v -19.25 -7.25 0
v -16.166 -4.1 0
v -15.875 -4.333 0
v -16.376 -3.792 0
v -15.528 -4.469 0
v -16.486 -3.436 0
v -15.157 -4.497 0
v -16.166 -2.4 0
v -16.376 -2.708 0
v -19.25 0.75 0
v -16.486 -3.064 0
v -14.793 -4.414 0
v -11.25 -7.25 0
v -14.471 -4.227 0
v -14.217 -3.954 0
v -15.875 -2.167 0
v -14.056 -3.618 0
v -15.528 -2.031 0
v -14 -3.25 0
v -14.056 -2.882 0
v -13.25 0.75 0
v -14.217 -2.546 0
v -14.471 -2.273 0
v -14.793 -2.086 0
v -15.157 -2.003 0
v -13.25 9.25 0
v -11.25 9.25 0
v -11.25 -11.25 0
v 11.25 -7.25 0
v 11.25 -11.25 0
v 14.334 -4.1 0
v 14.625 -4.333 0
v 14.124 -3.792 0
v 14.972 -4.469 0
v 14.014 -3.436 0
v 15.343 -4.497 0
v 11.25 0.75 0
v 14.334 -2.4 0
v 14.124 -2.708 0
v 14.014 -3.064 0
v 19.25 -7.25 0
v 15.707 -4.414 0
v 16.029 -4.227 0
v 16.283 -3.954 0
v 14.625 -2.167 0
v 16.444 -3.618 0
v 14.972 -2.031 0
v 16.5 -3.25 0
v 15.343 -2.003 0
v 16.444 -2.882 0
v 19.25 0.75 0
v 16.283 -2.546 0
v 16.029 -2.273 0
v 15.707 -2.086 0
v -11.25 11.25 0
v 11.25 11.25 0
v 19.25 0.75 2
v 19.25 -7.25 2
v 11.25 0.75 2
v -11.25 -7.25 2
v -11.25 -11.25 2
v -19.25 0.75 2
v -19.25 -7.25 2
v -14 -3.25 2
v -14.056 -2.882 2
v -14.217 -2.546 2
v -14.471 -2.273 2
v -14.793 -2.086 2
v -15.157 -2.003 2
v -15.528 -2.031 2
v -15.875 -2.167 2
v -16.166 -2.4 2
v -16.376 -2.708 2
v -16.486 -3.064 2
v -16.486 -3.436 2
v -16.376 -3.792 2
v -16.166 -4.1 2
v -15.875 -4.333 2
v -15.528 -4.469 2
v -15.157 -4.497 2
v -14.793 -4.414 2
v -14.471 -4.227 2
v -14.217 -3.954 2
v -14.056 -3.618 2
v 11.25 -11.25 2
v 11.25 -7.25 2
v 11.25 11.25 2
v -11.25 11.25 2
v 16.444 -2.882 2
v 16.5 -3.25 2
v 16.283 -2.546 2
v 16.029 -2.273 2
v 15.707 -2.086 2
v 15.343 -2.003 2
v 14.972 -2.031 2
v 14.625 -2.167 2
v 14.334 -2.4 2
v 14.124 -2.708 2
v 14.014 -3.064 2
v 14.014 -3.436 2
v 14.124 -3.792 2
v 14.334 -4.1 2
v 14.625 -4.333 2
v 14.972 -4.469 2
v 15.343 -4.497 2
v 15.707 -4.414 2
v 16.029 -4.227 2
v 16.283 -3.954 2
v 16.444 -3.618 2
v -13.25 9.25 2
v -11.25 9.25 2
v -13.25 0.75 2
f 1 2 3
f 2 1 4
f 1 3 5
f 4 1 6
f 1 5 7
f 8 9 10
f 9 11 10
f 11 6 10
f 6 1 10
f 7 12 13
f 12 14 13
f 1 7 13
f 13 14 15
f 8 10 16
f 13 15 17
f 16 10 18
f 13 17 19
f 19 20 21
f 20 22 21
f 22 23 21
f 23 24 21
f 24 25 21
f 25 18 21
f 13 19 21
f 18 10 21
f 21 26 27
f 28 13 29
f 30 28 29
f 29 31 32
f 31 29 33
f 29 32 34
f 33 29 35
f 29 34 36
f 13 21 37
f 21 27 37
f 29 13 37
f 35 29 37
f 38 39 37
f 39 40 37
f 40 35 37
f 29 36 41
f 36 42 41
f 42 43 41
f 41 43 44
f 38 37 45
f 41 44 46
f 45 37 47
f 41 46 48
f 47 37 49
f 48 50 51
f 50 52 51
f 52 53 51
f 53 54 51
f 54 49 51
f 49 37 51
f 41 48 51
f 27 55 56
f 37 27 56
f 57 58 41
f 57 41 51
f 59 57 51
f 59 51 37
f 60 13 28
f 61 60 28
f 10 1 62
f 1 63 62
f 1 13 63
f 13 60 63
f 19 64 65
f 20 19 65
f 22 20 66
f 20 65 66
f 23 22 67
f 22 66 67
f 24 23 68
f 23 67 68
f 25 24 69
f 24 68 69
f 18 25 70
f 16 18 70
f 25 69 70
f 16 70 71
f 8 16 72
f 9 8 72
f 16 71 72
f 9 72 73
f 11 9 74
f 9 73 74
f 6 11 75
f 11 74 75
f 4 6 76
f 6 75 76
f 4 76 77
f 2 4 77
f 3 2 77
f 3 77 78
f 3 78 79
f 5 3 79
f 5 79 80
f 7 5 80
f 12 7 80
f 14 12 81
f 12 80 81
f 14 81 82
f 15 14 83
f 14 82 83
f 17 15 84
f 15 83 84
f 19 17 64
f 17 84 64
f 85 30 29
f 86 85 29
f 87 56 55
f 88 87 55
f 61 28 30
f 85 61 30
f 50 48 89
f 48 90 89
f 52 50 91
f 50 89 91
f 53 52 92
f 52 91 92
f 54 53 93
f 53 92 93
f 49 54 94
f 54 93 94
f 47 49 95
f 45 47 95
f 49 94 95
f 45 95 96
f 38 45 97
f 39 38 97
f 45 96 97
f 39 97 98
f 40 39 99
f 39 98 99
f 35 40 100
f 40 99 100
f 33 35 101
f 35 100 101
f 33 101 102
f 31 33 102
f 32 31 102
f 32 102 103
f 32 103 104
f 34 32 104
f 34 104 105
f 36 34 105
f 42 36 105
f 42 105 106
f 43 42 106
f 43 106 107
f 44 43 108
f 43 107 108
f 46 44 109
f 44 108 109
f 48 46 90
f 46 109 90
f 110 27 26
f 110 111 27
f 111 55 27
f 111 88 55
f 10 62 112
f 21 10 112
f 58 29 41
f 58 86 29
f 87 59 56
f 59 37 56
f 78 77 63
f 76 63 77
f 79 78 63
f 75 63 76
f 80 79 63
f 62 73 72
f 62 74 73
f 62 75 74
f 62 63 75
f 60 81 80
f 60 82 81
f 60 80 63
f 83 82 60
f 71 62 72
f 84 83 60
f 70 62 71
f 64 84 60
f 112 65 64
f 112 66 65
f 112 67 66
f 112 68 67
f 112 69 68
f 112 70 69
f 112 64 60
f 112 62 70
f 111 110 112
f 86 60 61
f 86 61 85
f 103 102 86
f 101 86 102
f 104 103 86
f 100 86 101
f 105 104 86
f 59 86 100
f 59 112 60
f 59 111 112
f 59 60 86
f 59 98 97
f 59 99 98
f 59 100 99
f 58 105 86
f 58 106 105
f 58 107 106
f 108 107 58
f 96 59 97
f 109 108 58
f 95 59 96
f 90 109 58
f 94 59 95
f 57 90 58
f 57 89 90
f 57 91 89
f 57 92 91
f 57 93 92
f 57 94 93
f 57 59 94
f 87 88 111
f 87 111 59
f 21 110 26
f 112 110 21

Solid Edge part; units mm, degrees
sketch "Sketch1" plane through (0, 0, 0) normal (0, 0, 1) x (1, 0, 0)
  line L0 (-11.25, -11.25) -> (11.25, -11.25)
  line L1 (11.25, -11.25) -> (11.25, 11.25)
  line L2 (11.25, 11.25) -> (-11.25, 11.25)
  line L3 (-11.25, 11.25) -> (-11.25, -11.25)
  dimension "D1" = 22.5
  dimension "D2" = 22.5
extrude "Protrusion1" add sketch "Sketch1" along normal blind 2
sketch "Sketch2" plane through (0, 0, 2) normal (0, 0, 1) x (1, 0, 0)
  line L0 (11.25, -7.25) -> (19.25, -7.25)
  line L1 (19.25, -7.25) -> (19.25, 0.75)
  line L2 (19.25, 0.75) -> (11.25, 0.75)
  line L3 (11.25, 0.75) -> (11.25, -7.25)
  dimension "D1" = 8
  dimension "D2" = 4
extrude "Protrusion2" add sketch "Sketch2" against normal up to vertex (2 mm away)
sketch "Sketch3" plane through (4, 0, 2) normal (0, 0, 1) x (1, 0, 0)
  line L0 (-15.25, -7.25) -> (-23.25, -7.25)
  line L1 (-23.25, -7.25) -> (-23.25, 0.75)
  line L2 (-23.25, 0.75) -> (-15.25, 0.75)
  line L3 (-15.25, 0.75) -> (-15.25, -7.25)
  dimension "D1" = 4
extrude "Extrusionsausprägung_3" add sketch "Sketch3" against normal blind 2
sketch "Sketch4" plane through (0, 0, 2) normal (0, 0, 1) x (1, 0, 0)
  circle A0 centre (-15.25, -3.25) radius 1.25
  circle A1 centre (15.25, -3.25) radius 1.25
  dimension "D1" = 2.5
extrude "Cutout1" cut sketch "Sketch4" against normal through all
sketch "Sketch5" plane through (0, 0, 2) normal (0, 0, 1) x (1, 0, 0)
  line L0 (-11.25, 11.25) -> (-13.25, 11.25)
  line L1 (-13.25, 11.25) -> (-13.25, 0.75)
  line L2 (-13.25, 0.75) -> (-11.25, 0.75)
  line L3 (-11.25, 0.75) -> (-11.25, 11.25)
  dimension "D1" = 2
extrude "Protrusion3" add sketch "Sketch5" against normal up to vertex (2 mm away)
sketch "Sketch6" plane through (0, 0, 2) normal (0, 0, 1) x (1, 0, 0)
  line L0 (-13.25, 11.25) -> (-11.25, 11.25)
  line L1 (-11.25, 11.25) -> (-11.25, 9.25)
  line L2 (-11.25, 9.25) -> (-13.25, 9.25)
  line L3 (-13.25, 9.25) -> (-13.25, 11.25)
  dimension "D1" = 2
  dimension "D2" = 2
extrude "Cutout2" cut sketch "Sketch6" against normal through all
